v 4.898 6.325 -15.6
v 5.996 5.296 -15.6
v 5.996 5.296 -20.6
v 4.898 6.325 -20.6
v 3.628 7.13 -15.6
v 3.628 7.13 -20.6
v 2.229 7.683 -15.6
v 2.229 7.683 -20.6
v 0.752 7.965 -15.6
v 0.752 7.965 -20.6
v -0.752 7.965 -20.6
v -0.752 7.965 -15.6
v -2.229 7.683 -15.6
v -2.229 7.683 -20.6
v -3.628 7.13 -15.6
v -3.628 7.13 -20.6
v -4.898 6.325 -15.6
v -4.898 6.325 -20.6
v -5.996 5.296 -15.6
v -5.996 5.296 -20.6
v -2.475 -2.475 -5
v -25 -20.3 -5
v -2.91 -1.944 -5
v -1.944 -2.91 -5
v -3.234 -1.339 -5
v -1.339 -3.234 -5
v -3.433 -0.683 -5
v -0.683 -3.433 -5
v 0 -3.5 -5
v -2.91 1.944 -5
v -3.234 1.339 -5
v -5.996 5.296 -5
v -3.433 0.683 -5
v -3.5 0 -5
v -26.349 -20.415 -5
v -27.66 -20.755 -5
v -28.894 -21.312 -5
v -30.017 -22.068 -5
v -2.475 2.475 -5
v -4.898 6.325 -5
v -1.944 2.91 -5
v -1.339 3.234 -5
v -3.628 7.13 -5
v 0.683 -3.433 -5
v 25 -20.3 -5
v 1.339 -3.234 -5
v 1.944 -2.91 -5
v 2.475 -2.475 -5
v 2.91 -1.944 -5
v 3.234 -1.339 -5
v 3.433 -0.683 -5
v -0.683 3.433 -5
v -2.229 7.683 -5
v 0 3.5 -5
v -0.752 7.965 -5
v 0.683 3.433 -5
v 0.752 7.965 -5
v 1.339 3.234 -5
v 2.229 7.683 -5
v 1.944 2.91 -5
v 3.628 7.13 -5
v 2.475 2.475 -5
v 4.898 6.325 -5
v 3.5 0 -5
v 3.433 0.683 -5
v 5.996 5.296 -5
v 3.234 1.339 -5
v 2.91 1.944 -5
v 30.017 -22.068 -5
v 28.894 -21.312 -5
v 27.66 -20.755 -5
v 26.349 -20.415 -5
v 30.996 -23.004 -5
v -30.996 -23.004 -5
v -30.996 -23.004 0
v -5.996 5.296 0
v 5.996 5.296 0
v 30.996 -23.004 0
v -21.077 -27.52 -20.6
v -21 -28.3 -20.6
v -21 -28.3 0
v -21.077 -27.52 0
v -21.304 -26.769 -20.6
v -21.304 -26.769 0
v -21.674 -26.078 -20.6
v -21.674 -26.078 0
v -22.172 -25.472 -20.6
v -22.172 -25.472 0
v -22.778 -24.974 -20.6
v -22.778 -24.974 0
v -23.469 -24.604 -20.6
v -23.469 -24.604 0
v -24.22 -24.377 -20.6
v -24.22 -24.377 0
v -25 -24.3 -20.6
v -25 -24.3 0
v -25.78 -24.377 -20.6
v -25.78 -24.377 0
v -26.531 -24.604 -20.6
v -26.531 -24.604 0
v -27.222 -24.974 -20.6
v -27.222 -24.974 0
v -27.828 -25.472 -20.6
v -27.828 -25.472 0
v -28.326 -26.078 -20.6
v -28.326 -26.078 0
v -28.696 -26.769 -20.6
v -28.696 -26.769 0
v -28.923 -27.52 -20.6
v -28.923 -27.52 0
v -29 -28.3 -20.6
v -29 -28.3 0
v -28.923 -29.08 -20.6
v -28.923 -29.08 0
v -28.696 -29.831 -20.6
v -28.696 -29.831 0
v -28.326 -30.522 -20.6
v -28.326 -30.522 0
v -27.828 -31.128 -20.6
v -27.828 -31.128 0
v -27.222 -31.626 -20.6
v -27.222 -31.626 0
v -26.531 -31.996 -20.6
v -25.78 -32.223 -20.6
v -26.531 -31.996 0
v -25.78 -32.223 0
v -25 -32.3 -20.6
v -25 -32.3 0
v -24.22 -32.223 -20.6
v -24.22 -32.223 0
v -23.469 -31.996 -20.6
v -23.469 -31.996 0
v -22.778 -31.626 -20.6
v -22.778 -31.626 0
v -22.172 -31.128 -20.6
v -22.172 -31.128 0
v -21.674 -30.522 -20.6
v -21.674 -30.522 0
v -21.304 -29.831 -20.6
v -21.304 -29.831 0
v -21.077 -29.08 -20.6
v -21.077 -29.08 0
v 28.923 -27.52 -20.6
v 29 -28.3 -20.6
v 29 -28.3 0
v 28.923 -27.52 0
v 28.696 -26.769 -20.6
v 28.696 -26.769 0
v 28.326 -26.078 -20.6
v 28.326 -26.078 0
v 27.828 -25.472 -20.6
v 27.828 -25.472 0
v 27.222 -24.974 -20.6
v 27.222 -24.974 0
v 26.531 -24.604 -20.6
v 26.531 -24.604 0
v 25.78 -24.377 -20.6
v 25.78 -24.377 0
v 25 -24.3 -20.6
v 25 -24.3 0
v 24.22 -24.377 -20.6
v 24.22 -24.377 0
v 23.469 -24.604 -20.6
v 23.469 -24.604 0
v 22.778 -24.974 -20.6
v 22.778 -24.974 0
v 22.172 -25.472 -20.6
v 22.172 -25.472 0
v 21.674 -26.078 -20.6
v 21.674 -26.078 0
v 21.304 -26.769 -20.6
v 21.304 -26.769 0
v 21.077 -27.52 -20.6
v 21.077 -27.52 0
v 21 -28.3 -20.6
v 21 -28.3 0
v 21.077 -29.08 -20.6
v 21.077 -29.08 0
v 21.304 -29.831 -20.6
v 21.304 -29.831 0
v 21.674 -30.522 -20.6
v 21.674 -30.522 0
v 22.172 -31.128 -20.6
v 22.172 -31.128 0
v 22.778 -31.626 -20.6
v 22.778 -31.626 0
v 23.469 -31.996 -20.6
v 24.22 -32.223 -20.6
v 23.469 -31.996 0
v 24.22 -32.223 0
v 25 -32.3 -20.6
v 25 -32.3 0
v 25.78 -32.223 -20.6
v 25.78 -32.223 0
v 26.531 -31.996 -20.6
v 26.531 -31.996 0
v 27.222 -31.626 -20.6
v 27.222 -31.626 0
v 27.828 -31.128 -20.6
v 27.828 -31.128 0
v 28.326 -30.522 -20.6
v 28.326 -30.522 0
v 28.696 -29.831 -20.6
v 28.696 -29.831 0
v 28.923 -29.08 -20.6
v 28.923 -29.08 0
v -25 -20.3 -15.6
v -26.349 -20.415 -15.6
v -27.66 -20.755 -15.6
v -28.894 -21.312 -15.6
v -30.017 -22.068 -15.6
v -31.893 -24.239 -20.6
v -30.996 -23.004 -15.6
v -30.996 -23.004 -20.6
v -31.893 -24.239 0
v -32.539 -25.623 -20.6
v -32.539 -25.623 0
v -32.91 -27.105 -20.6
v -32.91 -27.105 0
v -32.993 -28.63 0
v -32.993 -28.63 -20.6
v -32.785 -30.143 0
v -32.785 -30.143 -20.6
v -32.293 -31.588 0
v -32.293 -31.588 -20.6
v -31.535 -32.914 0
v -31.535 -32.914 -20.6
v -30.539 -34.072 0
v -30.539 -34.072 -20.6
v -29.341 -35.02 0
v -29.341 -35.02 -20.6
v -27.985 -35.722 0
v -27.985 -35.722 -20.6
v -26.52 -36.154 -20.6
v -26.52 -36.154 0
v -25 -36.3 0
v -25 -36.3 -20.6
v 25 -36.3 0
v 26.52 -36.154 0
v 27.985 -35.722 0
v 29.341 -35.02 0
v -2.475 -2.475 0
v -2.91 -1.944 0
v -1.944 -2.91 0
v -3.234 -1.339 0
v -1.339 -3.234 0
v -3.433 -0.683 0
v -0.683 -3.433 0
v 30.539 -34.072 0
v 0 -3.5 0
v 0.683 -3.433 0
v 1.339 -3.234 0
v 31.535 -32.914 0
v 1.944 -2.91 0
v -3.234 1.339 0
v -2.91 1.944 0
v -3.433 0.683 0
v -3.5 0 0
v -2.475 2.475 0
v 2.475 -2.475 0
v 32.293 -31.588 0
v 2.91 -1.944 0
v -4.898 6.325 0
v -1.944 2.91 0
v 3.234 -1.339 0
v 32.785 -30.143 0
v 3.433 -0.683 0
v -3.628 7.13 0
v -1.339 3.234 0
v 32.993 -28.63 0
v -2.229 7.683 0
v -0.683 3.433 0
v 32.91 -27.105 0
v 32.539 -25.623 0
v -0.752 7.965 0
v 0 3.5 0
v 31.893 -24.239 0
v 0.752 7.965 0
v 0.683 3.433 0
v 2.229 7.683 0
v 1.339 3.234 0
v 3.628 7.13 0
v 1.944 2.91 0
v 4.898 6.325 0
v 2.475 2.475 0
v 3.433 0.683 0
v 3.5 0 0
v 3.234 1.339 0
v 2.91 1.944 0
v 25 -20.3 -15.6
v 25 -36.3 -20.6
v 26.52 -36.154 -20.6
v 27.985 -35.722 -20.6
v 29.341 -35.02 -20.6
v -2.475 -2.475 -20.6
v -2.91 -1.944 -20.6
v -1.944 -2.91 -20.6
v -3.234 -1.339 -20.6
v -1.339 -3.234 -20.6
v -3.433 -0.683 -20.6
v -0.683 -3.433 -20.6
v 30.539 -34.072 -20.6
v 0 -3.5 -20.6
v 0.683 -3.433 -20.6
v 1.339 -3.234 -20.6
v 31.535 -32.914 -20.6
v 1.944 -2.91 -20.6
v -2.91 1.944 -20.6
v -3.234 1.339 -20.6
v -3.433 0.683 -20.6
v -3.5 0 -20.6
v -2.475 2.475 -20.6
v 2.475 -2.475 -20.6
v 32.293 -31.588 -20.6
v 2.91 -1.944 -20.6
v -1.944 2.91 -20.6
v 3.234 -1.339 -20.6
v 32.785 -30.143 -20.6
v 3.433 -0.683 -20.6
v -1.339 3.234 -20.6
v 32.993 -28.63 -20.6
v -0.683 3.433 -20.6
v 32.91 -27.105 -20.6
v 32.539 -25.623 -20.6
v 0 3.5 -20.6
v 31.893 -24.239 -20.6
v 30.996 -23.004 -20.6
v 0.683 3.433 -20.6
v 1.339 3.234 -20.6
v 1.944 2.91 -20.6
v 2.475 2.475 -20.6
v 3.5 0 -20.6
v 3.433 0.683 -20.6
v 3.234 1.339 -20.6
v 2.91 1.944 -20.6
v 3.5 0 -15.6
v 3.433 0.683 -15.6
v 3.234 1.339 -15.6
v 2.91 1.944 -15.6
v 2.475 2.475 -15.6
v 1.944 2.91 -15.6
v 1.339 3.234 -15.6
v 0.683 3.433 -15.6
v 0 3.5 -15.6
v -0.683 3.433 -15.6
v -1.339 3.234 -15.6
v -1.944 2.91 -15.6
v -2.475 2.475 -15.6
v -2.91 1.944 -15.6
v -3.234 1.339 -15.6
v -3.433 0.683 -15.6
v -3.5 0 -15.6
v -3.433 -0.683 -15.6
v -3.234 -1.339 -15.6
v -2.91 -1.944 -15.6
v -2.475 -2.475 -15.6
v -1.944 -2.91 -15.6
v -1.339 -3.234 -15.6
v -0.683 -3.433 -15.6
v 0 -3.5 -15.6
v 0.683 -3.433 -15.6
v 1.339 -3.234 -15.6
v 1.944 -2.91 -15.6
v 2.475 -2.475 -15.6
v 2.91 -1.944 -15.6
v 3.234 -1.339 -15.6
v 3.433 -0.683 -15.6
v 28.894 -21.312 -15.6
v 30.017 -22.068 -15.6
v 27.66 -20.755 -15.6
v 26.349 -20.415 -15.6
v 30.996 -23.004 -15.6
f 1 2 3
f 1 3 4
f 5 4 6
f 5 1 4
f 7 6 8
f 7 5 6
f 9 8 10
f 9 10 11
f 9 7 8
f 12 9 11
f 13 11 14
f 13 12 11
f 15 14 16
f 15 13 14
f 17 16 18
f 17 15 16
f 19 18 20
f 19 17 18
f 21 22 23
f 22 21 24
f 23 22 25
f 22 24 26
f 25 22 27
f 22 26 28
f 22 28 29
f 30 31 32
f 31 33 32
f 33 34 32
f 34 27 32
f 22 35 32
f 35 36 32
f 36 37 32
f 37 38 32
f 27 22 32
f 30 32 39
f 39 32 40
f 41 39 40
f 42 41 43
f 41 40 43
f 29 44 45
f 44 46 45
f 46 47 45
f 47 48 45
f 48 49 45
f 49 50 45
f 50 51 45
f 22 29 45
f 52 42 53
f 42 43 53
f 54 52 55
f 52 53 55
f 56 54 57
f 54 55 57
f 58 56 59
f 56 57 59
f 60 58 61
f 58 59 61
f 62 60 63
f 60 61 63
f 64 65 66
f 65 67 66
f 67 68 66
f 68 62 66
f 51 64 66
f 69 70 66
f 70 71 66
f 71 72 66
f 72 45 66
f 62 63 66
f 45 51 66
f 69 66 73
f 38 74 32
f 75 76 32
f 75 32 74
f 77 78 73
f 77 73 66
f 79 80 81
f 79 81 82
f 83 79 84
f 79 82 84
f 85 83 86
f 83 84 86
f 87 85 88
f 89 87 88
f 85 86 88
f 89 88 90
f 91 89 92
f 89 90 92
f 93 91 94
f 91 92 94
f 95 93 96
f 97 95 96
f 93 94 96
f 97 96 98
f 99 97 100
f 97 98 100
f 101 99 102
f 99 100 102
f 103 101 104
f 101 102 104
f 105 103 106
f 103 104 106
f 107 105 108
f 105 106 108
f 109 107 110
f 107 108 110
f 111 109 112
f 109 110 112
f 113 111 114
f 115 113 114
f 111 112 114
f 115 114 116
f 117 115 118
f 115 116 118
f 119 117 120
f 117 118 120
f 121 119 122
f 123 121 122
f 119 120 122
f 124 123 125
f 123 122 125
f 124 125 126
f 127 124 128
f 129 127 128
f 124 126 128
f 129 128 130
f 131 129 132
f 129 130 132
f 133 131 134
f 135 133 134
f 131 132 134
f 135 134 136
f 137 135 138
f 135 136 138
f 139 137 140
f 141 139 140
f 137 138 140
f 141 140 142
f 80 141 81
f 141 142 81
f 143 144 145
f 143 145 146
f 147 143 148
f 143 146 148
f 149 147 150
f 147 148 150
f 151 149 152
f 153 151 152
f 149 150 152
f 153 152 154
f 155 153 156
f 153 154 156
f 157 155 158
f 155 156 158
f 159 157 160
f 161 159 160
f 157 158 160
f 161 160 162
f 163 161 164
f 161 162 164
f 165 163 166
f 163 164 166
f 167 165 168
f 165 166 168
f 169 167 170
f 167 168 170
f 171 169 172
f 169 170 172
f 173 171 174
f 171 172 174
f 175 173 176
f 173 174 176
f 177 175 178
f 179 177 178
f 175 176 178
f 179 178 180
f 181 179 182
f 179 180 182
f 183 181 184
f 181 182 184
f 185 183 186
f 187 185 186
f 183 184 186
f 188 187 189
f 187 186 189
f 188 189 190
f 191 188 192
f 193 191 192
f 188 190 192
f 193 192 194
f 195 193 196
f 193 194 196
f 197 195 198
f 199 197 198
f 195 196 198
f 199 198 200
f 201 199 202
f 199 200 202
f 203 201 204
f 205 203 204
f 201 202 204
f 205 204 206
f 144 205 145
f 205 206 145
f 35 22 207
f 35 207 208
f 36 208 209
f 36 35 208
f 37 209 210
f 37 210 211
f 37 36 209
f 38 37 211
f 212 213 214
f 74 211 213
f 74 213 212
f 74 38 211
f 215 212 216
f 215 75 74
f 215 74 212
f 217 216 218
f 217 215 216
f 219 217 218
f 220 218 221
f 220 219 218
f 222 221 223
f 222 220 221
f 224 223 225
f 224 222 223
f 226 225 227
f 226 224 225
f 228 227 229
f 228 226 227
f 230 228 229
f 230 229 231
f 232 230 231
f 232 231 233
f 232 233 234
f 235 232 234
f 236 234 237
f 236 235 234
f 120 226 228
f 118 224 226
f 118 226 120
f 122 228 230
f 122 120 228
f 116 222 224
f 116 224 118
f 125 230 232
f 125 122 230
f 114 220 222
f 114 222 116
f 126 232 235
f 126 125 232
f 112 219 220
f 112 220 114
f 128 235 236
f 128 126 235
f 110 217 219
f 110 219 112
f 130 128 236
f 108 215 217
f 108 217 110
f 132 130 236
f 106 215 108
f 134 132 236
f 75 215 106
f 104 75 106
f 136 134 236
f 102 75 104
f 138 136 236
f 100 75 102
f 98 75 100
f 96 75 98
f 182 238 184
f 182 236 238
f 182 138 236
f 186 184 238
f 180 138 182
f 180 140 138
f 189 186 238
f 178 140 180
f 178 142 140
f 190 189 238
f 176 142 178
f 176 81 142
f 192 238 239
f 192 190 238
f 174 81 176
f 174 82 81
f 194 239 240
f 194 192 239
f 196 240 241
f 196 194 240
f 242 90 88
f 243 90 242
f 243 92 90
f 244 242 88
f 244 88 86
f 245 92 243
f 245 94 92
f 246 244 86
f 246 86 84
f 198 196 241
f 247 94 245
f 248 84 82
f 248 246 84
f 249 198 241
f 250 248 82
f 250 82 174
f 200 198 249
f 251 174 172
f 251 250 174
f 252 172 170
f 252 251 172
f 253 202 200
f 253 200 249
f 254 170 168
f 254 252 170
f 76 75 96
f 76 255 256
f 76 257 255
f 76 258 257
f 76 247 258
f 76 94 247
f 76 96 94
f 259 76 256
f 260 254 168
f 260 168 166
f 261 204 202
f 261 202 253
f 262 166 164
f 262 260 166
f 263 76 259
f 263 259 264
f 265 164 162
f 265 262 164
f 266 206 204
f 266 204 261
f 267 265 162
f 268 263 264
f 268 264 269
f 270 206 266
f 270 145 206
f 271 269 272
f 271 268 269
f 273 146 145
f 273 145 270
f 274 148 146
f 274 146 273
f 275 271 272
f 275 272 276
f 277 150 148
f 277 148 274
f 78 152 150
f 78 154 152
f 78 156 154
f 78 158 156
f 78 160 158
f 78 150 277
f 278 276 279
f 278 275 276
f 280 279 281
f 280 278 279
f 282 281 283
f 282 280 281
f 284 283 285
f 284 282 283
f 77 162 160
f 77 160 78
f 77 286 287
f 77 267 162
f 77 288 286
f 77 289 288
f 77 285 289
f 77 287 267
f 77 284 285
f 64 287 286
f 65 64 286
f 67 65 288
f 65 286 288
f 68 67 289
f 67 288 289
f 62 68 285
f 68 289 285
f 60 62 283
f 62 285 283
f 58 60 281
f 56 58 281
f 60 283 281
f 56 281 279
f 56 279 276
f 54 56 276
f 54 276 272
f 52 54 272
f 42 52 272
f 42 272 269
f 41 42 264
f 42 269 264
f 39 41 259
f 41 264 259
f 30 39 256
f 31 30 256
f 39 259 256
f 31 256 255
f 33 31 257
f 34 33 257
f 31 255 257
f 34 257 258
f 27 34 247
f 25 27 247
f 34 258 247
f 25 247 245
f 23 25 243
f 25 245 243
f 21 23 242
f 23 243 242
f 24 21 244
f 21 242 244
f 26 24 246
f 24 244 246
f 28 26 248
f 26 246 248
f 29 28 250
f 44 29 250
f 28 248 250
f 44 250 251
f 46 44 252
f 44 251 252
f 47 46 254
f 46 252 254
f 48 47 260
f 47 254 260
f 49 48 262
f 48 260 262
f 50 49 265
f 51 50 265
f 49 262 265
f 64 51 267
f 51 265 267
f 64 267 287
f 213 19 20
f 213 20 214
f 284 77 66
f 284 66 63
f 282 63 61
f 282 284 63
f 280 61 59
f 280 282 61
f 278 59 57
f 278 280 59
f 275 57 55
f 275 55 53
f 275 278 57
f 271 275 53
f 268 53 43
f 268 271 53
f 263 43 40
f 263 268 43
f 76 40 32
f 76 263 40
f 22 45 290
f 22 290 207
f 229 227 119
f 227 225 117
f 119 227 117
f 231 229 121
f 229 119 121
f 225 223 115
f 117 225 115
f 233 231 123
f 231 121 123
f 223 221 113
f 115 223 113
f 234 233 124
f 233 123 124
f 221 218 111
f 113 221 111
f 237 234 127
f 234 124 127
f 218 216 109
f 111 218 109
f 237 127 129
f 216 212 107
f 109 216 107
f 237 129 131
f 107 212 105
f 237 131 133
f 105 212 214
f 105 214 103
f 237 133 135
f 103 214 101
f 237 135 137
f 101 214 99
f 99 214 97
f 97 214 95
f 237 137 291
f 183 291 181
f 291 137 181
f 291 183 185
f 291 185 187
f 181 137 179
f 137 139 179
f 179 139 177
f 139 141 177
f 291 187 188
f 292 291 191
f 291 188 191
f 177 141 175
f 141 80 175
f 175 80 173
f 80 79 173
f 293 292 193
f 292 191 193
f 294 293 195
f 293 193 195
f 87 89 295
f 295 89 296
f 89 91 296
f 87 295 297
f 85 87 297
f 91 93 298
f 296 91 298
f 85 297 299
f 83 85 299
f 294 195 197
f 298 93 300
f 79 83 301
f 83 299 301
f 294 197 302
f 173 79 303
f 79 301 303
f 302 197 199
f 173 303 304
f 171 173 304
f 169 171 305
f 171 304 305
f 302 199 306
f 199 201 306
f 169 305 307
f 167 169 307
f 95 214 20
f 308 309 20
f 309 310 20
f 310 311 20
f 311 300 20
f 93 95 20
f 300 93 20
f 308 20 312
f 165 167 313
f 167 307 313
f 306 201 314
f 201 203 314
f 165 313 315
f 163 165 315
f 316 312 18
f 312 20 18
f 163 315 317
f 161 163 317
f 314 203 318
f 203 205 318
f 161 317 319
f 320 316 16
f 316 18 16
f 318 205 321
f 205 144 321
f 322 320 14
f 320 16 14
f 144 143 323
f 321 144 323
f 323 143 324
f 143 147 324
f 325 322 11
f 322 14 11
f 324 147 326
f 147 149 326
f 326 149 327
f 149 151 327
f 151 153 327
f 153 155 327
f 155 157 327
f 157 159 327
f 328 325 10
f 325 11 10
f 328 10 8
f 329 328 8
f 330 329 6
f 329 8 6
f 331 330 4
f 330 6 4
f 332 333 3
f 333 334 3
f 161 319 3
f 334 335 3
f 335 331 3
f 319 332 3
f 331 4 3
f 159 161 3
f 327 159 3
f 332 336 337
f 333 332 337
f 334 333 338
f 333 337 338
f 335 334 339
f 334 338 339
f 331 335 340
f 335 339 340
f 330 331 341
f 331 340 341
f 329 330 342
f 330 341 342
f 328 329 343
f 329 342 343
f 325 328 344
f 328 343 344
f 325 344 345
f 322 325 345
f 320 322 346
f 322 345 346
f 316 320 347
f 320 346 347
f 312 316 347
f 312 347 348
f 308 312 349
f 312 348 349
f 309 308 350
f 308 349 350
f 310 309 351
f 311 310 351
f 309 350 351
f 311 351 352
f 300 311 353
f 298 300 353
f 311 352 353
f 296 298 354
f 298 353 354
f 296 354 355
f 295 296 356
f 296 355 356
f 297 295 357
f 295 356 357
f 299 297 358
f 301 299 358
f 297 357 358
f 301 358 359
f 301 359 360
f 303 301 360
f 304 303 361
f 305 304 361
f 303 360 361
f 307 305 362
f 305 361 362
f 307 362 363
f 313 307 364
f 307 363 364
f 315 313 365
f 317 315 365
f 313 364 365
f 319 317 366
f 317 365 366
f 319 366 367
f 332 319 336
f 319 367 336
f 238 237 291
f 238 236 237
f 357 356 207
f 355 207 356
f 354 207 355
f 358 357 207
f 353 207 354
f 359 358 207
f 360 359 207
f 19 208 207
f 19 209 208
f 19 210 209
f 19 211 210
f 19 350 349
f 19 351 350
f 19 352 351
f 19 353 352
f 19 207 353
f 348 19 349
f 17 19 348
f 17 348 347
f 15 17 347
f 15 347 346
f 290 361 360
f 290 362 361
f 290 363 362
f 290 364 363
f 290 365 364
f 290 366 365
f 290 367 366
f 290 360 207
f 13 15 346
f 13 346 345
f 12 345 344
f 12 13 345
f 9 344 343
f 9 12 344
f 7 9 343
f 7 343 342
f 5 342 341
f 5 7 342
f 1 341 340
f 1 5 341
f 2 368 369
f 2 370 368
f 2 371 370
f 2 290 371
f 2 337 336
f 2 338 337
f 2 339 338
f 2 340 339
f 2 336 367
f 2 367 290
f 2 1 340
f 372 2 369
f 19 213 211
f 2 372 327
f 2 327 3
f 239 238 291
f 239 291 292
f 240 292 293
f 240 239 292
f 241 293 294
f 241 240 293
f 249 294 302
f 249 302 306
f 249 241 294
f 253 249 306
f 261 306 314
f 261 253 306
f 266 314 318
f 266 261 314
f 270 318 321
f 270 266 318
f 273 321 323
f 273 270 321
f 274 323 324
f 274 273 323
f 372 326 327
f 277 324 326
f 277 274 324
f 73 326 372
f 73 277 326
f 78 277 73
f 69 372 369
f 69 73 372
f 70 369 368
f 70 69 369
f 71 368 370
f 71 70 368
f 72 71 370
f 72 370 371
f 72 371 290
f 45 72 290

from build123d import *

# Parameters (mm, degrees)
SKETCH1_R           = 4
SKETCH1_R_2         = 3.5
BOSS_EXTRUDE1_DEPTH = 5
BOSS_EXTRUDE2_START = -5
SKETCH1_3_R         = 4
BOSS_EXTRUDE2_DEPTH = 10.6
BOSS_EXTRUDE3_START = -15.6
SKETCH1_4_R         = 4
SKETCH1_4_R_2       = 3.5
BOSS_EXTRUDE3_DEPTH = 5


with BuildPart() as part:
    # Sketch1 → Boss-Extrude1 (new body)
    # profile 1 of 2: a face of its own
    with BuildSketch(Plane.XY):
        with BuildLine():
            Line((-25, -36.3), (25, -36.3))
            ThreePointArc((25, -36.3), (32.292866569, -31.588479467), (30.995610492, -23.003524301))
            ThreePointArc((30.995610492, -23.003524301), (28.288479467, -21.007133431), (25, -20.3))
            Line((25, -20.3), (-25, -20.3))
            ThreePointArc((-25, -20.3), (-28.288479467, -21.007133431), (-30.995610492, -23.003524301))
            ThreePointArc((-30.995610492, -23.003524301), (-32.292866569, -31.588479467), (-25, -36.3))
        make_face()
        with Locations((-25, -28.3)):
            Circle(SKETCH1_R, mode=Mode.SUBTRACT)
        with Locations((25, -28.3)):
            Circle(SKETCH1_R, mode=Mode.SUBTRACT)
    # profile 2 of 2: a face of its own
    with BuildSketch(Plane.XY):
        with BuildLine():
            ThreePointArc((25, -20.3), (28.288479467, -21.007133431), (30.995610492, -23.003524301))
            Line((30.995610492, -23.003524301), (5.995610492, 5.296475699))
            ThreePointArc((5.995610492, 5.296475699), (0, 8), (-5.995610492, 5.296475699))
            Line((-5.995610492, 5.296475699), (-30.995610492, -23.003524301))
            ThreePointArc((-30.995610492, -23.003524301), (-28.288479467, -21.007133431), (-25, -20.3))
            Line((-25, -20.3), (25, -20.3))
        make_face()
        Circle(SKETCH1_R_2, mode=Mode.SUBTRACT)
    extrude(amount=-BOSS_EXTRUDE1_DEPTH)

    # Sketch1<3> → Boss-Extrude2 (add)
    with BuildSketch(Plane.XY.offset(BOSS_EXTRUDE2_START)):
        with BuildLine():
            Line((-25, -36.3), (25, -36.3))
            ThreePointArc((25, -36.3), (32.292866569, -31.588479467), (30.995610492, -23.003524301))
            ThreePointArc((30.995610492, -23.003524301), (28.288479467, -21.007133431), (25, -20.3))
            Line((25, -20.3), (-25, -20.3))
            ThreePointArc((-25, -20.3), (-28.288479467, -21.007133431), (-30.995610492, -23.003524301))
            ThreePointArc((-30.995610492, -23.003524301), (-32.292866569, -31.588479467), (-25, -36.3))
        make_face()
        with Locations((-25, -28.3)):
            Circle(SKETCH1_3_R, mode=Mode.SUBTRACT)
        with Locations((25, -28.3)):
            Circle(SKETCH1_3_R, mode=Mode.SUBTRACT)
    extrude(amount=-BOSS_EXTRUDE2_DEPTH)

    # Sketch1<4> → Boss-Extrude3 (add)
    # profile 1 of 2: a face of its own
    with BuildSketch(Plane.XY.offset(BOSS_EXTRUDE3_START)):
        with BuildLine():
            Line((-25, -36.3), (25, -36.3))
            ThreePointArc((25, -36.3), (32.292866569, -31.588479467), (30.995610492, -23.003524301))
            ThreePointArc((30.995610492, -23.003524301), (28.288479467, -21.007133431), (25, -20.3))
            Line((25, -20.3), (-25, -20.3))
            ThreePointArc((-25, -20.3), (-28.288479467, -21.007133431), (-30.995610492, -23.003524301))
            ThreePointArc((-30.995610492, -23.003524301), (-32.292866569, -31.588479467), (-25, -36.3))
        make_face()
        with Locations((-25, -28.3)):
            Circle(SKETCH1_4_R, mode=Mode.SUBTRACT)
        with Locations((25, -28.3)):
            Circle(SKETCH1_4_R, mode=Mode.SUBTRACT)
    # profile 2 of 2: a face of its own
    with BuildSketch(Plane.XY.offset(BOSS_EXTRUDE3_START)):
        with BuildLine():
            ThreePointArc((25, -20.3), (28.288479467, -21.007133431), (30.995610492, -23.003524301))
            Line((30.995610492, -23.003524301), (5.995610492, 5.296475699))
            ThreePointArc((5.995610492, 5.296475699), (0, 8), (-5.995610492, 5.296475699))
            Line((-5.995610492, 5.296475699), (-30.995610492, -23.003524301))
            ThreePointArc((-30.995610492, -23.003524301), (-28.288479467, -21.007133431), (-25, -20.3))
            Line((-25, -20.3), (25, -20.3))
        make_face()
        Circle(SKETCH1_4_R_2, mode=Mode.SUBTRACT)
    extrude(amount=-BOSS_EXTRUDE3_DEPTH)


solid = part.part
